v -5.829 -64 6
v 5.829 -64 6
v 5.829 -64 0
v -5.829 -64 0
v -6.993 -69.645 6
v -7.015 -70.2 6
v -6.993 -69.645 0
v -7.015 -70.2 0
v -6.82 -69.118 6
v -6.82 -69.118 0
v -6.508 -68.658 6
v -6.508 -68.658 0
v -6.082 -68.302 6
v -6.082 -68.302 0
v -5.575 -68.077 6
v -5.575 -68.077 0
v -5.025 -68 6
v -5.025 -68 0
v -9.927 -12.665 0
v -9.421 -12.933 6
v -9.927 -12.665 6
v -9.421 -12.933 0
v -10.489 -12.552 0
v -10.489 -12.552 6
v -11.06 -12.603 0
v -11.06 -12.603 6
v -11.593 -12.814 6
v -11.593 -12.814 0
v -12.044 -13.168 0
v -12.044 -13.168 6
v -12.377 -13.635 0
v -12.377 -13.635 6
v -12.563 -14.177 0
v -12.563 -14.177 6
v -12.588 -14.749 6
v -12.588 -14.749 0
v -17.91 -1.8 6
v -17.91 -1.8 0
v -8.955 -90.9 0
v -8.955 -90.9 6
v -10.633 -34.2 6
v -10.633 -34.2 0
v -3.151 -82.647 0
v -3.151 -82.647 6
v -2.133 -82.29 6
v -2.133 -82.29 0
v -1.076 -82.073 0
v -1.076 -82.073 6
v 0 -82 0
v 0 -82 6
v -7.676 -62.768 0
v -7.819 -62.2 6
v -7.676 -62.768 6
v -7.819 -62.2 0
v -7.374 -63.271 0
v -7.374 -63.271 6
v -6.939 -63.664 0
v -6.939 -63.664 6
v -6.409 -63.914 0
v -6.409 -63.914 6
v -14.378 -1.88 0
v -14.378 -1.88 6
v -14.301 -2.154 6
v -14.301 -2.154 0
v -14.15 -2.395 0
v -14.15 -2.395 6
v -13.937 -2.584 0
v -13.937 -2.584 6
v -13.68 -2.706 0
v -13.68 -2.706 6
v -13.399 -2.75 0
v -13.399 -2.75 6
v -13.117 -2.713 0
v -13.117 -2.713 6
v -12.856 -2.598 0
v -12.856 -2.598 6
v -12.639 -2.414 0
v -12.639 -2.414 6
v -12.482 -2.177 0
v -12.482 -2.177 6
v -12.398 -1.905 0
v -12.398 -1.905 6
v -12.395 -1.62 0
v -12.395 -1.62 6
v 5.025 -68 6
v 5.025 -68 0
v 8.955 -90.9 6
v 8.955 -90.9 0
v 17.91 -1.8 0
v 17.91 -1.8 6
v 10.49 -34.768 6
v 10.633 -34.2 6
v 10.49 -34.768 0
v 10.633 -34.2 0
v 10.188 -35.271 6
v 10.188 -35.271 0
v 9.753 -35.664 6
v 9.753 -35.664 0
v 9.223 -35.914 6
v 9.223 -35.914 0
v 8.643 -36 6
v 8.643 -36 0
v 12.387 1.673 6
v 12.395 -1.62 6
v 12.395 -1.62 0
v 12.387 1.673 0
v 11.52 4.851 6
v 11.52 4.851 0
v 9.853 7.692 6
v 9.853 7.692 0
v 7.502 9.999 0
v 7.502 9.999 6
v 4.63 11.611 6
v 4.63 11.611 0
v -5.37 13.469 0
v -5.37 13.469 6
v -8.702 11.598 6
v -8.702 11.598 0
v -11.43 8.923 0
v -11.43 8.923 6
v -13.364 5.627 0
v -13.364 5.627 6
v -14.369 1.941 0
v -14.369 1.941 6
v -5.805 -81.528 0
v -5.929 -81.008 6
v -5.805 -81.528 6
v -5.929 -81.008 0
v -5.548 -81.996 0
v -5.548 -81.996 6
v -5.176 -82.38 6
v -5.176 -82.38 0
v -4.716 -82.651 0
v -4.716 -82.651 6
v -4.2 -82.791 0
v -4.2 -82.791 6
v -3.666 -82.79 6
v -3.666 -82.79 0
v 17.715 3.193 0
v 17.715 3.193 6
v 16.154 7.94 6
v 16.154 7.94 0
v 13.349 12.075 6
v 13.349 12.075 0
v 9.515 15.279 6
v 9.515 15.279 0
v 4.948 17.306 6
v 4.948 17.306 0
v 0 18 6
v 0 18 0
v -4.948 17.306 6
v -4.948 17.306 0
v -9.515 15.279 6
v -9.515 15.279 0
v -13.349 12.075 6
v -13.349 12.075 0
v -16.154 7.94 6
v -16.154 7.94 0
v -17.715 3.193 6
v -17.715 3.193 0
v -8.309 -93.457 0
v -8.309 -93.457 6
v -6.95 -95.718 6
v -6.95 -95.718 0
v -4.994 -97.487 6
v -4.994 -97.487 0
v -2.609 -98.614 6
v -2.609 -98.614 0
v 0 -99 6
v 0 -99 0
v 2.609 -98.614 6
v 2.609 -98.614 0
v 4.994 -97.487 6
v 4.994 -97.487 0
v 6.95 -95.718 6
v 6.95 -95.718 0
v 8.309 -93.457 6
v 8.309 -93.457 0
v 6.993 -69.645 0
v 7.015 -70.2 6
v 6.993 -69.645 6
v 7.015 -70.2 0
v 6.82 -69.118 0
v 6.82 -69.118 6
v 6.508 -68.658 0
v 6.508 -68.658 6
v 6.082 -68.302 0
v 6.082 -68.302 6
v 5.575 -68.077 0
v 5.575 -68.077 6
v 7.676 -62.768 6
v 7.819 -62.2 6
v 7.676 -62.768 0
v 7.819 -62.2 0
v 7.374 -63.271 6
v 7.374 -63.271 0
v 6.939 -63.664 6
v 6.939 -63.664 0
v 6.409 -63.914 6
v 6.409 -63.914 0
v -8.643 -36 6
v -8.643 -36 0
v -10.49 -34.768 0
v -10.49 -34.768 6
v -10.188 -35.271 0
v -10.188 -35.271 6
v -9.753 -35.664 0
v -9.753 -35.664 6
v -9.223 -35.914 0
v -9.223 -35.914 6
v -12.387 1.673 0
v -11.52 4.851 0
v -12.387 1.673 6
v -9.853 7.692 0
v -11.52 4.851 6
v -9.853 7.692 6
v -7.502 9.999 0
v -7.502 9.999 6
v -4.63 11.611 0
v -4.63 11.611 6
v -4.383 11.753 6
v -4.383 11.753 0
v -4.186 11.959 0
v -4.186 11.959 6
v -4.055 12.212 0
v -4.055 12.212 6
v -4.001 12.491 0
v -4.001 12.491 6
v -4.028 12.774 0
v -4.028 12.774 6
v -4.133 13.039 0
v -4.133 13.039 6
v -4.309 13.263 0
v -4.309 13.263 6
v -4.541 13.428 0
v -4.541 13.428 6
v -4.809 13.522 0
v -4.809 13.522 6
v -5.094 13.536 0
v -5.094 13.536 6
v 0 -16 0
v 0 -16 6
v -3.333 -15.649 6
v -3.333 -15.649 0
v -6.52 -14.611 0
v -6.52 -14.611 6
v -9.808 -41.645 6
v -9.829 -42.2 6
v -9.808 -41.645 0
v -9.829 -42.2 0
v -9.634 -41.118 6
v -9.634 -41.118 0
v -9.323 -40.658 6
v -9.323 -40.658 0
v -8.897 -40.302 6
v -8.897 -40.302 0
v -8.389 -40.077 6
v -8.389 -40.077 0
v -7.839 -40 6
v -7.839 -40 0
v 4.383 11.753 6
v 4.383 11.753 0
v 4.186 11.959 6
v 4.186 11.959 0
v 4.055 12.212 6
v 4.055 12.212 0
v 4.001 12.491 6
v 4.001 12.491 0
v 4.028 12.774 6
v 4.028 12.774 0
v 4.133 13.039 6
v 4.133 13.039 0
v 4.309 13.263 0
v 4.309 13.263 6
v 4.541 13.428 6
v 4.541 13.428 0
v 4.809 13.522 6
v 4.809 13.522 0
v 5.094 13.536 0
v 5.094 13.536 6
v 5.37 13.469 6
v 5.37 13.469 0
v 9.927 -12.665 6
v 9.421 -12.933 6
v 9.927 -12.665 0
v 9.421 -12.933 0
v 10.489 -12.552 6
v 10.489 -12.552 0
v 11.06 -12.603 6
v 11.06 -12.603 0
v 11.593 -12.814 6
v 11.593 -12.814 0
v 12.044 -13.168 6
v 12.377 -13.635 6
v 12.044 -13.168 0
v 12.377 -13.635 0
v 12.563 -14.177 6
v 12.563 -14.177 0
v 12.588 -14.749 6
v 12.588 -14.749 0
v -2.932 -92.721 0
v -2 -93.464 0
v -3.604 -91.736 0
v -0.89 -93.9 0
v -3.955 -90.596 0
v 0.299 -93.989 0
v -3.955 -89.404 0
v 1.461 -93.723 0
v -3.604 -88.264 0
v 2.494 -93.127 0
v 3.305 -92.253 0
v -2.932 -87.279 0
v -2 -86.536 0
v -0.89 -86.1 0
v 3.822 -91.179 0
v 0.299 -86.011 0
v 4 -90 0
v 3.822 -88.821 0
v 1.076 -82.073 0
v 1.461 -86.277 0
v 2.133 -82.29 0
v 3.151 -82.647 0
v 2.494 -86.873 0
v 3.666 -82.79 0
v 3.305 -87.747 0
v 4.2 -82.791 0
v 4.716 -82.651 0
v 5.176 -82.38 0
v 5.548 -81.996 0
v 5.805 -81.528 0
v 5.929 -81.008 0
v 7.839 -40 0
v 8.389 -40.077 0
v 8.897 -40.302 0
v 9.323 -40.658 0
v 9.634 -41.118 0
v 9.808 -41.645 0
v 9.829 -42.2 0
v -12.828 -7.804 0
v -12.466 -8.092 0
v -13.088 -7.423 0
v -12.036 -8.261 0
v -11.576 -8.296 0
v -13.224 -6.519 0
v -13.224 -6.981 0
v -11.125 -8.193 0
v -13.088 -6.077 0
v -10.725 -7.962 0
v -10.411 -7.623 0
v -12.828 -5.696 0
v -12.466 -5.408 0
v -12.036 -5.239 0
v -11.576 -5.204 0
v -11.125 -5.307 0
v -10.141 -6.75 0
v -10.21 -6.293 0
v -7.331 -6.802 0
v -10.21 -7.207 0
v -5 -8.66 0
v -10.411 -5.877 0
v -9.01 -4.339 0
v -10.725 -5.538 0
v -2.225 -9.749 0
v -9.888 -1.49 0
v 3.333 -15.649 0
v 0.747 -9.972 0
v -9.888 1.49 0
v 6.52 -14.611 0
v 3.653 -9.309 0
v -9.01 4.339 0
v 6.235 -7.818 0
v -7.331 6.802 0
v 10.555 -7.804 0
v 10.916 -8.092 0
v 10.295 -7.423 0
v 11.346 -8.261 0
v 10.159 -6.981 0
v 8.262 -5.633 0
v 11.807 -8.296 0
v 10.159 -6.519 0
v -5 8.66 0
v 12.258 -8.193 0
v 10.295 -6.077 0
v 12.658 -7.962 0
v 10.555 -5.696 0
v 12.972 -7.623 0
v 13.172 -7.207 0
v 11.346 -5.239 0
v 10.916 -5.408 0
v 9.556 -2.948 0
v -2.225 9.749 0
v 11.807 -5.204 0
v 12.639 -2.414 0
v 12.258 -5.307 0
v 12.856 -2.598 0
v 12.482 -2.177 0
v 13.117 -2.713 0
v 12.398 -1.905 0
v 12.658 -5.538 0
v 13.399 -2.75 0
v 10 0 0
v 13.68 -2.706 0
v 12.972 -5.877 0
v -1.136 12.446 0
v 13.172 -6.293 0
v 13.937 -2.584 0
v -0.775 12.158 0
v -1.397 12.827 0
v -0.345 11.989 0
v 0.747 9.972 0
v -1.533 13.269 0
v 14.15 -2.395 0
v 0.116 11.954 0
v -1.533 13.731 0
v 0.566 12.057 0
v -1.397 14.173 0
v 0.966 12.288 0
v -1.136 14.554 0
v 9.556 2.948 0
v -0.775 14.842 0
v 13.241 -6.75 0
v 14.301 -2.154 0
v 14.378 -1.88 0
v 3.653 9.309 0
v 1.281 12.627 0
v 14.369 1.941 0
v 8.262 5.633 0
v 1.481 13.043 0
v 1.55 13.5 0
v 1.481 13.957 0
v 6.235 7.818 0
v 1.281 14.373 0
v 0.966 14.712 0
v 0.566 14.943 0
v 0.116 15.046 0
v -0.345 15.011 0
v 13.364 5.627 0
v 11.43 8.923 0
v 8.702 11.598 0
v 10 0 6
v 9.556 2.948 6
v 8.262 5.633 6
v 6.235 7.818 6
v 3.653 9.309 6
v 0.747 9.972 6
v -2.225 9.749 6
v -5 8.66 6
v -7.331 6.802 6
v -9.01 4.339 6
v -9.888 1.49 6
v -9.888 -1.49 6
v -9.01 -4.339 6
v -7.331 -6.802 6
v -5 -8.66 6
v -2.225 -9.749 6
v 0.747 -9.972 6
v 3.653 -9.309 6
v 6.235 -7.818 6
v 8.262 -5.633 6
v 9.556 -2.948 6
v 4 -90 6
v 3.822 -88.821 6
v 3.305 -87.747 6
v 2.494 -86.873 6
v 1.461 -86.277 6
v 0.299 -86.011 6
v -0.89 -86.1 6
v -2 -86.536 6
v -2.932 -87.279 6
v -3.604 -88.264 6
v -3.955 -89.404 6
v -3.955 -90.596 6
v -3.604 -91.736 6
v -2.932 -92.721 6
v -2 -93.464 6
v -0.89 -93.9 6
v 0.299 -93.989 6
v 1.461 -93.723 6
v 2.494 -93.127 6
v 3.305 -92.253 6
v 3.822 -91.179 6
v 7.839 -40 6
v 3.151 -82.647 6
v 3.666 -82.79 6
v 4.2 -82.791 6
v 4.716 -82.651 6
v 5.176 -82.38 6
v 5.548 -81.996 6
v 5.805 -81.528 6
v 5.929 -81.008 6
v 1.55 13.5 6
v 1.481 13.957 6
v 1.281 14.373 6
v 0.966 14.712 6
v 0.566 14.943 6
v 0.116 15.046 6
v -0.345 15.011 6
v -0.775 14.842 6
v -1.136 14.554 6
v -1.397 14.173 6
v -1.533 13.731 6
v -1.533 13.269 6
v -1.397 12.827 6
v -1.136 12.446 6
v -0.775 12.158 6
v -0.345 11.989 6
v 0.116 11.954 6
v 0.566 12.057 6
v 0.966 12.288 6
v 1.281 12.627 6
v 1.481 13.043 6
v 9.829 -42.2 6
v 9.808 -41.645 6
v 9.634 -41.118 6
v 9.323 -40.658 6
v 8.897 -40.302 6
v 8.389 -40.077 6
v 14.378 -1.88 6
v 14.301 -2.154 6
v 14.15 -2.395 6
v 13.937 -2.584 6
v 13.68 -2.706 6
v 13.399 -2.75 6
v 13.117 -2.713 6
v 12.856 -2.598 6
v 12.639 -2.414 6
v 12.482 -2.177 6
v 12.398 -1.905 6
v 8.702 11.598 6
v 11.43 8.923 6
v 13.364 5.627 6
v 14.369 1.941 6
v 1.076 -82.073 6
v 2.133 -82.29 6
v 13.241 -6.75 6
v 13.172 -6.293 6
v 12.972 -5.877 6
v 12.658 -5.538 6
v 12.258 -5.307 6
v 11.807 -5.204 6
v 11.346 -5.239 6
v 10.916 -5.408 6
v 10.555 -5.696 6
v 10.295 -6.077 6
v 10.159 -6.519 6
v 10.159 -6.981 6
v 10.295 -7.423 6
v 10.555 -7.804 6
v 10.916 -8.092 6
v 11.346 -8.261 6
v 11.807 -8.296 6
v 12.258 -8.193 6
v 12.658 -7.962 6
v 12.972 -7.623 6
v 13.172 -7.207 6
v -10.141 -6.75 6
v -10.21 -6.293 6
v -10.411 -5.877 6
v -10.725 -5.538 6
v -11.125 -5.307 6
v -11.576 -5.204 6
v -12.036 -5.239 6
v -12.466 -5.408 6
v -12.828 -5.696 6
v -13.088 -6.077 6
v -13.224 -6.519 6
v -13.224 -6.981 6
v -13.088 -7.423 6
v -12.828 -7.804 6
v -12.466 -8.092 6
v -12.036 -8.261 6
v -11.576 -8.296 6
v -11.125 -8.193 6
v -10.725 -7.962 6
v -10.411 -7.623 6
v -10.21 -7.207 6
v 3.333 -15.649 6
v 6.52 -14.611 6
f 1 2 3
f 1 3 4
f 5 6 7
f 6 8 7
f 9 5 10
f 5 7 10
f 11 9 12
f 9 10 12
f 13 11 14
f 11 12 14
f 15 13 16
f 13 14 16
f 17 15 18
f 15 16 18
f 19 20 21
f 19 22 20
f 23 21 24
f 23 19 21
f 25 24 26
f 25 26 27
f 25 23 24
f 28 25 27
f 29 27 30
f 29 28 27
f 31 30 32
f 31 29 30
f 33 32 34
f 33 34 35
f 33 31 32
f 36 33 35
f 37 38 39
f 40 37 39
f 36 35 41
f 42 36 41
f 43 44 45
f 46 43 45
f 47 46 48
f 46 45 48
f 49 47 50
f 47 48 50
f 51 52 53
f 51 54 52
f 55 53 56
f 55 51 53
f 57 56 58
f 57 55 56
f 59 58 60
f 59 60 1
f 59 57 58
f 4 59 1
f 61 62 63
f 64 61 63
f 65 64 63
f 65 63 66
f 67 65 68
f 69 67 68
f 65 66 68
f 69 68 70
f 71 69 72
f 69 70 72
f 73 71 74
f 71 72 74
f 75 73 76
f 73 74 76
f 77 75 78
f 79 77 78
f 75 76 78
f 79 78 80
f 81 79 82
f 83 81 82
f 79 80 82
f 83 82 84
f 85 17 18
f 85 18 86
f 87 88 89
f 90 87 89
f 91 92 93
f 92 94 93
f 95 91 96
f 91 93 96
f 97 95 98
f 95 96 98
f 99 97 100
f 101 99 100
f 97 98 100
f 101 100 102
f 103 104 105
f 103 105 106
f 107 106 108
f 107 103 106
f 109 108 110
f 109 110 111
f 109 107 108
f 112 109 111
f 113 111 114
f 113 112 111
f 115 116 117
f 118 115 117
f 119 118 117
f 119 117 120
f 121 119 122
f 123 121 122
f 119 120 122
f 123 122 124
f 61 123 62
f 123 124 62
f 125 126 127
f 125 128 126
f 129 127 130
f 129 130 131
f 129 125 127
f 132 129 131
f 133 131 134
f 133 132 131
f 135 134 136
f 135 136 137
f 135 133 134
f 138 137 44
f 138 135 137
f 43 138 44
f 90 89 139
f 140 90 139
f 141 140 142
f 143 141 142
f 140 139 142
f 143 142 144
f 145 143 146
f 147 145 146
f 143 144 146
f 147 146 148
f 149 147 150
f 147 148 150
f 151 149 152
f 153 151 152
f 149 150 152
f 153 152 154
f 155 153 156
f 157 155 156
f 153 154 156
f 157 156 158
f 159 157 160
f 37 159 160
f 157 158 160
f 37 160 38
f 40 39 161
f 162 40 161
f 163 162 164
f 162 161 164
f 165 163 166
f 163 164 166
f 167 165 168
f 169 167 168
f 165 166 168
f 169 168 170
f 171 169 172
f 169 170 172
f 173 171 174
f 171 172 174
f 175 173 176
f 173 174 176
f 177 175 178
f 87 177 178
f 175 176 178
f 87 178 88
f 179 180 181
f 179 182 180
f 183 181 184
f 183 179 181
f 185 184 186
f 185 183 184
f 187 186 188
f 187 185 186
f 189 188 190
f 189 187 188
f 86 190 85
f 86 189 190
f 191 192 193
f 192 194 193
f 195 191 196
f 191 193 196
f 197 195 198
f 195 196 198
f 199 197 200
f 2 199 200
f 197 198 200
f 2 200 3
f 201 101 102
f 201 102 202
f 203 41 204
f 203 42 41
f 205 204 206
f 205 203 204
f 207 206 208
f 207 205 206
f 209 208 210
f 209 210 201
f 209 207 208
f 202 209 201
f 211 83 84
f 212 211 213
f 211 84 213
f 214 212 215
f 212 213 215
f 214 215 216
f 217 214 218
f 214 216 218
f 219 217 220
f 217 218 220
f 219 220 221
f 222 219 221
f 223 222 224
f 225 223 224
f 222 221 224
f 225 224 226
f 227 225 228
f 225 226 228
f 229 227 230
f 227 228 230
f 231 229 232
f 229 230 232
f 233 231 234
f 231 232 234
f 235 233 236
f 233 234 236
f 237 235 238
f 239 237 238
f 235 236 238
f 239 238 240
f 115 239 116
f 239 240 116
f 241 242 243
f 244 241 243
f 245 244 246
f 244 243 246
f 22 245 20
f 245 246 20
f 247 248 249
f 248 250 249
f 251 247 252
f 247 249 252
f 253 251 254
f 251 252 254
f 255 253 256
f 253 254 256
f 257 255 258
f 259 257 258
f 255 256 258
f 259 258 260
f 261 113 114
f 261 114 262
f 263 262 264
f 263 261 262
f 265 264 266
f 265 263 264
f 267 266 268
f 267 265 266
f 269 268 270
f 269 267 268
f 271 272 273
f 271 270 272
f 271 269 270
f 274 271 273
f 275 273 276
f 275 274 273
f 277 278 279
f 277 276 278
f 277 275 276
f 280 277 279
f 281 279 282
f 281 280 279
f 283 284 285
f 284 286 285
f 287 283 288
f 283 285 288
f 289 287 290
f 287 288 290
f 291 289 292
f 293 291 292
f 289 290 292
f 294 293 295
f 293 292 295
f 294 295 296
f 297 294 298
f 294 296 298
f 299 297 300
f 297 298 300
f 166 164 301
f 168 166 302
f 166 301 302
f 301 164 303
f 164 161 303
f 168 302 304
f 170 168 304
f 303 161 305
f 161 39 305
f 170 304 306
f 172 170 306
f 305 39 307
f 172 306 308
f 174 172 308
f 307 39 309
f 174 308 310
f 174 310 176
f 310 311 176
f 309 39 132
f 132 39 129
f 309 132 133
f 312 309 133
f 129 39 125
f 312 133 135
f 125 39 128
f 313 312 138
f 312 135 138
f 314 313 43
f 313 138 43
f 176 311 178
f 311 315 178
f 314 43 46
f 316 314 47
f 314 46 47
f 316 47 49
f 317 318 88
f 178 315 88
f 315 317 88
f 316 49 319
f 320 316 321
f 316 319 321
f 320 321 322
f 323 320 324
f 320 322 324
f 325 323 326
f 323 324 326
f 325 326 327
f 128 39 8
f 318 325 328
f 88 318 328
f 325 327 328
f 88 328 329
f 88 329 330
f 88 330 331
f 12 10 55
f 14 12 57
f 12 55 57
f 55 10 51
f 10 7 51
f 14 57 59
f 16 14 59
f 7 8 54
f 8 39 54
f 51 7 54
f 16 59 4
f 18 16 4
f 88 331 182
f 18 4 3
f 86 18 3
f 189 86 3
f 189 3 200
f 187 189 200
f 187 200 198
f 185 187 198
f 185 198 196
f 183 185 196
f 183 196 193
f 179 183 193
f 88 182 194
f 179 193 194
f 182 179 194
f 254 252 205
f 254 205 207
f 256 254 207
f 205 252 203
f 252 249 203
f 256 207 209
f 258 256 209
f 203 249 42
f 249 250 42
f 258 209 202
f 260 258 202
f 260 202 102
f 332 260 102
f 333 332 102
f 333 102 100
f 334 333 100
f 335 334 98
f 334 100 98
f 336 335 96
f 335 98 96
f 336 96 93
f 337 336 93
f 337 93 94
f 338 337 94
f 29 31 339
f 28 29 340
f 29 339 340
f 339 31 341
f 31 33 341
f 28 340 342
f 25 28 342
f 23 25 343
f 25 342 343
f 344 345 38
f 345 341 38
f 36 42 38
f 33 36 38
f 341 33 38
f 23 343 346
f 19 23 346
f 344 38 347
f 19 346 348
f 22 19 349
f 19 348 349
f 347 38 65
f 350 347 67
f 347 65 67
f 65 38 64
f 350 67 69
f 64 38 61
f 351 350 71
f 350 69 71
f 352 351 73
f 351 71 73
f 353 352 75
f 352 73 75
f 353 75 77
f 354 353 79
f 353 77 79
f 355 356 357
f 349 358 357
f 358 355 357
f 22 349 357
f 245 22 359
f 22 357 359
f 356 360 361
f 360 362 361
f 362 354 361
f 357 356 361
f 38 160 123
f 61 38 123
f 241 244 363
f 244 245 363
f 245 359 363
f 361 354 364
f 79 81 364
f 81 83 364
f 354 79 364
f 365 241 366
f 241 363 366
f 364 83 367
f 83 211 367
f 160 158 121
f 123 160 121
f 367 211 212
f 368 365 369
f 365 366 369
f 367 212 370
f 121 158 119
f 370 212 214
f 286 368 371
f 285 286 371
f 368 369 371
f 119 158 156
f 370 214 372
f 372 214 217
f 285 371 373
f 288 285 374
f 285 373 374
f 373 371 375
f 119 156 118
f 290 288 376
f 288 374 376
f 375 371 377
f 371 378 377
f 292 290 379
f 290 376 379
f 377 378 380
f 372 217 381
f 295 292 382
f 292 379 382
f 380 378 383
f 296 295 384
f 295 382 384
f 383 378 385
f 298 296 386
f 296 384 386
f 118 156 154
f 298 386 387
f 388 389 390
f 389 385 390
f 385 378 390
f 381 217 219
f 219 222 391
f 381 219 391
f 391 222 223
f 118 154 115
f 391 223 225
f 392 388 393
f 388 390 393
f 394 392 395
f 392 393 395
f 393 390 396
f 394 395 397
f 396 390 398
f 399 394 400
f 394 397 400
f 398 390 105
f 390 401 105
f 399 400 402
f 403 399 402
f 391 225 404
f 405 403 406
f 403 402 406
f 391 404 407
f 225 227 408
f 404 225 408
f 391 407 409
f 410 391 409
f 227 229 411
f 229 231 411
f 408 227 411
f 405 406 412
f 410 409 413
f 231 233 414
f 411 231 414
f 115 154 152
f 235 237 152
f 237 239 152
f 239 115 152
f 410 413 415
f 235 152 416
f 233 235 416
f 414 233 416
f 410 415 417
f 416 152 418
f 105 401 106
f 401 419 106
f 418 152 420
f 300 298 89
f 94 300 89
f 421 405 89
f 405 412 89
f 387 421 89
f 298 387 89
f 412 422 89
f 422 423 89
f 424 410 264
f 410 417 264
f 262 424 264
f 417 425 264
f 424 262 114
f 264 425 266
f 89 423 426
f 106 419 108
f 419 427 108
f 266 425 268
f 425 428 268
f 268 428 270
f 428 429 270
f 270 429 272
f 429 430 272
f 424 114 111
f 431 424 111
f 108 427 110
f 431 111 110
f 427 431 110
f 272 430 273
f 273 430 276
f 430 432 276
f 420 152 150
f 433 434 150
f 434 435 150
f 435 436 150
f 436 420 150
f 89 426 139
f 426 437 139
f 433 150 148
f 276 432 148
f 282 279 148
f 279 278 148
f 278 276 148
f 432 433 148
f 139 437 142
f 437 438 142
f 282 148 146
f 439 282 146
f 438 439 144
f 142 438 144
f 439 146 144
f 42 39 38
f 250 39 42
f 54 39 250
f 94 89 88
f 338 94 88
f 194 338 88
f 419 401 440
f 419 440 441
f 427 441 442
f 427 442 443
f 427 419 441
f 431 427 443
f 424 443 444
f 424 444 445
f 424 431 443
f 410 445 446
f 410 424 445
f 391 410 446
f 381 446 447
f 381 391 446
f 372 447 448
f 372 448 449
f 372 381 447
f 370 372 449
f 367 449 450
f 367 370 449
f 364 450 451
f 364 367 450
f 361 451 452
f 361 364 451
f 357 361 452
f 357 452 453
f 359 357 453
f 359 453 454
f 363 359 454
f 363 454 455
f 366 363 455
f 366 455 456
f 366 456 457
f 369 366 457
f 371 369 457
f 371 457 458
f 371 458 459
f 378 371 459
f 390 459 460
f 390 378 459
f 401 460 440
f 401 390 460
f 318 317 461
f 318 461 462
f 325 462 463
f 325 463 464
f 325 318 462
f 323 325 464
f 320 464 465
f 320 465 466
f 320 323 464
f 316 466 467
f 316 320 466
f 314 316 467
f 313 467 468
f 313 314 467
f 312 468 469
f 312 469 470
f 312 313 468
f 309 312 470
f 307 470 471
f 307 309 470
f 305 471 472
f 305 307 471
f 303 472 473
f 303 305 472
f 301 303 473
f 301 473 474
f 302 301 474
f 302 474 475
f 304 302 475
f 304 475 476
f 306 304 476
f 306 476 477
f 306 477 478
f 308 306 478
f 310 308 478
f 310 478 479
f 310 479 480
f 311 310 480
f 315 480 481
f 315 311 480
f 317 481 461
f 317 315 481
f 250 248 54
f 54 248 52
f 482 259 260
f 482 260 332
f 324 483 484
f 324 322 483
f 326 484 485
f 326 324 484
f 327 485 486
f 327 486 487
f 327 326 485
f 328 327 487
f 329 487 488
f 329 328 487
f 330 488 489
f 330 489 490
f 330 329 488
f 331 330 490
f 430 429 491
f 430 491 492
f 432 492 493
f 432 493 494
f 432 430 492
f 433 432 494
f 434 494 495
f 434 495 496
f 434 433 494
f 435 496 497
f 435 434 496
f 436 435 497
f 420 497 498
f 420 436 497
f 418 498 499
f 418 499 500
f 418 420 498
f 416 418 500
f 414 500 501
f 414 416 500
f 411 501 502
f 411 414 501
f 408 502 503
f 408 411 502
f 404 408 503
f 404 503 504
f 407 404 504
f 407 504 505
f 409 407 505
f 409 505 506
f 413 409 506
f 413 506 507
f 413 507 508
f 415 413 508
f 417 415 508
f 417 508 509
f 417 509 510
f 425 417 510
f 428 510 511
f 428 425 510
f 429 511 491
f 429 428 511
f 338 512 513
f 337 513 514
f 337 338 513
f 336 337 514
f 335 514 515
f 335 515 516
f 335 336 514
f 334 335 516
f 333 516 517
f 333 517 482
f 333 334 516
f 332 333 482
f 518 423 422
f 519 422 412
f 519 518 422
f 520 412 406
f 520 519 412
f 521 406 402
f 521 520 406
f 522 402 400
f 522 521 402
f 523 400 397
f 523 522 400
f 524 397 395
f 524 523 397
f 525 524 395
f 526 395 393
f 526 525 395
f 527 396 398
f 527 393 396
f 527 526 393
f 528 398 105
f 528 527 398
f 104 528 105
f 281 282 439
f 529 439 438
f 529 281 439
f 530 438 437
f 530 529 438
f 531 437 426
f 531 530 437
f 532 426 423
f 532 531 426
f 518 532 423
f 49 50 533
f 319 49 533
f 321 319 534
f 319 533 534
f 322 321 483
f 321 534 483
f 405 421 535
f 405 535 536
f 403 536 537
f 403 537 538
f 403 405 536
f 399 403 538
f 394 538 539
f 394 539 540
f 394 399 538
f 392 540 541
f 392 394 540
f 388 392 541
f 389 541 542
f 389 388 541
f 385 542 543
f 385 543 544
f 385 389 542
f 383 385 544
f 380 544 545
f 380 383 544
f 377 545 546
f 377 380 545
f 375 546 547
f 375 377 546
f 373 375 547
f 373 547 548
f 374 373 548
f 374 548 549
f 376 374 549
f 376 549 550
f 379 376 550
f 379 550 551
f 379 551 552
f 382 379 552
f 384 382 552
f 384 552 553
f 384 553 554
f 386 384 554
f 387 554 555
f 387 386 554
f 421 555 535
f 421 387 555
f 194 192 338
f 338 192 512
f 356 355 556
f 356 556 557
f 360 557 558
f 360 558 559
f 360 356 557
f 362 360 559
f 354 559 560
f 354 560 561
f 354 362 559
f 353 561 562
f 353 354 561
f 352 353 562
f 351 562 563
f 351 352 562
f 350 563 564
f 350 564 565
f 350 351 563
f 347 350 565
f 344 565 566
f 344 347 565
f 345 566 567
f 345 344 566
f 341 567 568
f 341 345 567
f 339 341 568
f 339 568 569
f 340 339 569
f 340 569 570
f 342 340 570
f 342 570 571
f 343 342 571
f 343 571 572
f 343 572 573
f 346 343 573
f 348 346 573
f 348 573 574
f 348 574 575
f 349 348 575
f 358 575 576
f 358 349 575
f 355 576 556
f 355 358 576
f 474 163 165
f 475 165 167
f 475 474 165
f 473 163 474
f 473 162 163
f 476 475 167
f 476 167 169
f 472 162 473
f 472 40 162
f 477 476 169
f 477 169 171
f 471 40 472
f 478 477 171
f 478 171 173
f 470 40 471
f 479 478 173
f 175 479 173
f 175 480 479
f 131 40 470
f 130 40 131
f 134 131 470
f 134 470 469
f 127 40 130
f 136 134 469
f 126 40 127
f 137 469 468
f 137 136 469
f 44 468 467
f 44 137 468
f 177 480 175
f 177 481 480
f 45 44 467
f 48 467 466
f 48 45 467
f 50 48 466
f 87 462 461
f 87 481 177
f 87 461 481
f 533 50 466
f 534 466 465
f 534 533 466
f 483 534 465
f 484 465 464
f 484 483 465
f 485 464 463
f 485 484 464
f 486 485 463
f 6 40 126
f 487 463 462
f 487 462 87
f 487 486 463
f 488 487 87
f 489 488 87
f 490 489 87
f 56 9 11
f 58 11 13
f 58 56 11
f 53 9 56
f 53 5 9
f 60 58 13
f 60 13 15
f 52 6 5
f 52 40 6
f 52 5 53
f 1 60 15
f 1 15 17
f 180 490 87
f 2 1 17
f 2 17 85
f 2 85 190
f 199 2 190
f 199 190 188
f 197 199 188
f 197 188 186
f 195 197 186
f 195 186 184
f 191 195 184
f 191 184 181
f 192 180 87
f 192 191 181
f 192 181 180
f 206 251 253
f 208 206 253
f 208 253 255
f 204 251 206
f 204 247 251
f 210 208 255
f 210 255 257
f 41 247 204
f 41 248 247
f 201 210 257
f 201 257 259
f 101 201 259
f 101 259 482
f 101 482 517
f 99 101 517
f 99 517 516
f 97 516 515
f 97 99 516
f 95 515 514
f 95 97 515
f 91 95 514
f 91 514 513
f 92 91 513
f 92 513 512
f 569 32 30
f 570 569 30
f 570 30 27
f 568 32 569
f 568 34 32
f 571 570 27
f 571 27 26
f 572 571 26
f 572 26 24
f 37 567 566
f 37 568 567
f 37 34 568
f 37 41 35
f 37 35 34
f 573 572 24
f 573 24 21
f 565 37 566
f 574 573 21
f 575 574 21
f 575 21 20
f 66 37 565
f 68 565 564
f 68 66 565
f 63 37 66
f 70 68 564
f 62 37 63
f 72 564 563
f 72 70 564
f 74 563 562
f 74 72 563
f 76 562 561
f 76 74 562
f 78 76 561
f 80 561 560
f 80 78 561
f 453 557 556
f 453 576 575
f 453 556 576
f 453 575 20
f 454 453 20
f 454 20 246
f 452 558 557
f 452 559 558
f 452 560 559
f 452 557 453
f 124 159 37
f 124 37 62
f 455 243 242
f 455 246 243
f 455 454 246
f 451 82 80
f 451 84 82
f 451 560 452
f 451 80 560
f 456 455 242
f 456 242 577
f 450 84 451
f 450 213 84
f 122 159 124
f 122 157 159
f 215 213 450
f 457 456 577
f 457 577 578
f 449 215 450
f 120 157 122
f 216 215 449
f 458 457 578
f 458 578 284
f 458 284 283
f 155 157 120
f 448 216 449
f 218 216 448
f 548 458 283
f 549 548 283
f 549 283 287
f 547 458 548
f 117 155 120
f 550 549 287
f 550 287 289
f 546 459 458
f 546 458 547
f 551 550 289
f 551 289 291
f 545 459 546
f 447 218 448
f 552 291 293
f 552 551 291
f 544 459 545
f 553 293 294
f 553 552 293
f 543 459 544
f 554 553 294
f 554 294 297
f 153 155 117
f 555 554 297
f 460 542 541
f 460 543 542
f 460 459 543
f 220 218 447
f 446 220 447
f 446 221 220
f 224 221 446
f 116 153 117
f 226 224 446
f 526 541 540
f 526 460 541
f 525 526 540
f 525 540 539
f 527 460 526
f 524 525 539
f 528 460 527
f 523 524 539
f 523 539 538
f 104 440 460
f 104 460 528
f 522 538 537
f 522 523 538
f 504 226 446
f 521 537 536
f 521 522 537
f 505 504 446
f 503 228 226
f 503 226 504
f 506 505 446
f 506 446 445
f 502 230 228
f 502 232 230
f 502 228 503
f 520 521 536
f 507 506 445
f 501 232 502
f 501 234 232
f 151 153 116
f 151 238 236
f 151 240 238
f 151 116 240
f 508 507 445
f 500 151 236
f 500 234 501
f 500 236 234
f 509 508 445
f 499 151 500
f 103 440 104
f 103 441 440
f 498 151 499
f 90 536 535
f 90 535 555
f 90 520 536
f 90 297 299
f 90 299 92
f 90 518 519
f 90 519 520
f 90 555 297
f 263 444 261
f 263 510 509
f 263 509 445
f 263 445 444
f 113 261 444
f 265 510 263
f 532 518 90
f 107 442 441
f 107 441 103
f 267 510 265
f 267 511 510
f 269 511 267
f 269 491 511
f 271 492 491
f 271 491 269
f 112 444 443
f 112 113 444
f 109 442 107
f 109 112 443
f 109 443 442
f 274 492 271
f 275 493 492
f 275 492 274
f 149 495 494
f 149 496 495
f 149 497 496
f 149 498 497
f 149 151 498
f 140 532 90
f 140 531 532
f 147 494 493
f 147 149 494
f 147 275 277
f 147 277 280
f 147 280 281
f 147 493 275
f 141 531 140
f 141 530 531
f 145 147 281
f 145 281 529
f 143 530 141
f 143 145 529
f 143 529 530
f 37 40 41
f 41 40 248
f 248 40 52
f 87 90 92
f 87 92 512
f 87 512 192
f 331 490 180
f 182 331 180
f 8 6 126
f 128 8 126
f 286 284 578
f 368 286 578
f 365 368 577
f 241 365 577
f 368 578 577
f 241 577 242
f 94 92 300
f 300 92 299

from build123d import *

# Parameters (mm, degrees)
SKETCH_1_R          = 4
SKETCH_1_R_2        = 1.55
SKETCH_1_R_3        = 10
EXTRUDE_1_DEPTH     = 6
CUT_EXTRUDE_1_DEPTH = 6
EXTRUDE_2_DEPTH     = 6
FILLET_1_R          = 2
CUT_EXTRUDE_2_DEPTH = 10


with BuildPart() as part:
    # 草图1 → 凸台-拉伸1 (new body)
    with BuildSketch(Plane.XY):
        with BuildLine():
            ThreePointArc((17.909773868, -1.8), (0, 18), (-17.909773868, -1.8))
            Line((-17.909773868, -1.8), (-8.954886934, -90.9))
            ThreePointArc((-8.954886934, -90.9), (0, -99), (8.954886934, -90.9))
            Line((8.954886934, -90.9), (17.909773868, -1.8))
        make_face()
        with Locations((0, -90)):
            Circle(SKETCH_1_R, mode=Mode.SUBTRACT)
        with Locations((-11.691342951, -6.75)):
            Circle(SKETCH_1_R_2, mode=Mode.SUBTRACT)
        with Locations((11.691342951, -6.75)):
            Circle(SKETCH_1_R_2, mode=Mode.SUBTRACT)
        Circle(SKETCH_1_R_3, mode=Mode.SUBTRACT)
        with Locations((0, 13.5)):
            Circle(SKETCH_1_R_2, mode=Mode.SUBTRACT)
    extrude(amount=EXTRUDE_1_DEPTH)

    # 草图2 → 切除-拉伸1 (cut)
    with BuildSketch(Plane.XY.offset(6)):
        with BuildLine():
            ThreePointArc((13.15522745, -9.107139547), (7.425825451, -14.172406866), (0, -16))
            Line((0, -16), (0, -82))
            ThreePointArc((0, -82), (3.024106775, -82.593598835), (5.599436985, -84.286305447))
            Line((5.599436985, -84.286305447), (13.15522745, -9.107139547))
        make_face()
        with BuildLine():
            ThreePointArc((0, -16), (-7.425825451, -14.172406866), (-13.15522745, -9.107139547))
            Line((-13.15522745, -9.107139547), (-5.599436985, -84.286305447))
            ThreePointArc((-5.599436985, -84.286305447), (-3.024106775, -82.593598835), (0, -82))
            Line((0, -82), (0, -16))
        make_face()
    extrude(amount=-CUT_EXTRUDE_1_DEPTH, mode=Mode.SUBTRACT)

    # 草图3 → 凸台-拉伸2 (add)
    with BuildSketch(Plane.XY.offset(6)):
        Polygon((10.251385716, -38), (-10.251385716, -38), (-10.050378153, -40), (10.050378153, -40), align=None)
        Polygon((-10.452393279, -36), (-10.251385716, -38), (10.251385716, -38), (10.452393279, -36), align=None)
        Polygon((7.437279833, -66), (-7.437279833, -66), (-7.23627227, -68), (7.23627227, -68), align=None)
        Polygon((7.638287396, -64), (-7.638287396, -64), (-7.437279833, -66), (7.437279833, -66), align=None)
    extrude(amount=-EXTRUDE_2_DEPTH)

    # 圆角1
    fillet_1_edges = [part.edges().sort_by_distance(p)[0] for p in [
        (-13.15522745, -9.107139547, 3),
        (13.15522745, -9.107139547, 3),
        (5.599436985, -84.286305447, 3),
        (-5.599436985, -84.286305447, 3),
        (-10.050378153, -40, 3),
        (-10.452393279, -36, 3),
        (10.452393279, -36, 3),
        (10.050378153, -40, 3),
        (-7.23627227, -68, 3),
        (-7.638287396, -64, 3),
        (7.638287396, -64, 3),
        (7.23627227, -68, 3),
    ]]
    fillet(fillet_1_edges, radius=FILLET_1_R)

    # 草图4 → 切除-拉伸2 (cut)
    with BuildSketch(Plane.XY.offset(6)):
        with BuildLine():
            ThreePointArc((-4.62962963, 11.611052041), (-4.071115837, 12.910306574), (-5.37037037, 13.468820367))
            ThreePointArc((-5.37037037, 13.468820367), (-12.505593382, 7.338946393), (-14.377656014, -1.87962963))
            ThreePointArc((-14.377656014, -1.87962963), (-13.256463901, -2.741562484), (-12.394531047, -1.62037037))
            ThreePointArc((-12.394531047, -1.62037037), (-10.78068395, 6.326677925), (-4.62962963, 11.611052041))
        make_face()
        with BuildLine():
            ThreePointArc((5.37037037, 13.468820367), (12.505593382, 7.338946393), (14.377656014, -1.87962963))
            ThreePointArc((14.377656014, -1.87962963), (13.256463901, -2.741562484), (12.394531047, -1.62037037))
            ThreePointArc((12.394531047, -1.62037037), (10.78068395, 6.326677925), (4.62962963, 11.611052041))
            ThreePointArc((4.62962963, 11.611052041), (4.071115837, 12.910306574), (5.37037037, 13.468820367))
        make_face()
    extrude(amount=-CUT_EXTRUDE_2_DEPTH, mode=Mode.SUBTRACT)


solid = part.part
